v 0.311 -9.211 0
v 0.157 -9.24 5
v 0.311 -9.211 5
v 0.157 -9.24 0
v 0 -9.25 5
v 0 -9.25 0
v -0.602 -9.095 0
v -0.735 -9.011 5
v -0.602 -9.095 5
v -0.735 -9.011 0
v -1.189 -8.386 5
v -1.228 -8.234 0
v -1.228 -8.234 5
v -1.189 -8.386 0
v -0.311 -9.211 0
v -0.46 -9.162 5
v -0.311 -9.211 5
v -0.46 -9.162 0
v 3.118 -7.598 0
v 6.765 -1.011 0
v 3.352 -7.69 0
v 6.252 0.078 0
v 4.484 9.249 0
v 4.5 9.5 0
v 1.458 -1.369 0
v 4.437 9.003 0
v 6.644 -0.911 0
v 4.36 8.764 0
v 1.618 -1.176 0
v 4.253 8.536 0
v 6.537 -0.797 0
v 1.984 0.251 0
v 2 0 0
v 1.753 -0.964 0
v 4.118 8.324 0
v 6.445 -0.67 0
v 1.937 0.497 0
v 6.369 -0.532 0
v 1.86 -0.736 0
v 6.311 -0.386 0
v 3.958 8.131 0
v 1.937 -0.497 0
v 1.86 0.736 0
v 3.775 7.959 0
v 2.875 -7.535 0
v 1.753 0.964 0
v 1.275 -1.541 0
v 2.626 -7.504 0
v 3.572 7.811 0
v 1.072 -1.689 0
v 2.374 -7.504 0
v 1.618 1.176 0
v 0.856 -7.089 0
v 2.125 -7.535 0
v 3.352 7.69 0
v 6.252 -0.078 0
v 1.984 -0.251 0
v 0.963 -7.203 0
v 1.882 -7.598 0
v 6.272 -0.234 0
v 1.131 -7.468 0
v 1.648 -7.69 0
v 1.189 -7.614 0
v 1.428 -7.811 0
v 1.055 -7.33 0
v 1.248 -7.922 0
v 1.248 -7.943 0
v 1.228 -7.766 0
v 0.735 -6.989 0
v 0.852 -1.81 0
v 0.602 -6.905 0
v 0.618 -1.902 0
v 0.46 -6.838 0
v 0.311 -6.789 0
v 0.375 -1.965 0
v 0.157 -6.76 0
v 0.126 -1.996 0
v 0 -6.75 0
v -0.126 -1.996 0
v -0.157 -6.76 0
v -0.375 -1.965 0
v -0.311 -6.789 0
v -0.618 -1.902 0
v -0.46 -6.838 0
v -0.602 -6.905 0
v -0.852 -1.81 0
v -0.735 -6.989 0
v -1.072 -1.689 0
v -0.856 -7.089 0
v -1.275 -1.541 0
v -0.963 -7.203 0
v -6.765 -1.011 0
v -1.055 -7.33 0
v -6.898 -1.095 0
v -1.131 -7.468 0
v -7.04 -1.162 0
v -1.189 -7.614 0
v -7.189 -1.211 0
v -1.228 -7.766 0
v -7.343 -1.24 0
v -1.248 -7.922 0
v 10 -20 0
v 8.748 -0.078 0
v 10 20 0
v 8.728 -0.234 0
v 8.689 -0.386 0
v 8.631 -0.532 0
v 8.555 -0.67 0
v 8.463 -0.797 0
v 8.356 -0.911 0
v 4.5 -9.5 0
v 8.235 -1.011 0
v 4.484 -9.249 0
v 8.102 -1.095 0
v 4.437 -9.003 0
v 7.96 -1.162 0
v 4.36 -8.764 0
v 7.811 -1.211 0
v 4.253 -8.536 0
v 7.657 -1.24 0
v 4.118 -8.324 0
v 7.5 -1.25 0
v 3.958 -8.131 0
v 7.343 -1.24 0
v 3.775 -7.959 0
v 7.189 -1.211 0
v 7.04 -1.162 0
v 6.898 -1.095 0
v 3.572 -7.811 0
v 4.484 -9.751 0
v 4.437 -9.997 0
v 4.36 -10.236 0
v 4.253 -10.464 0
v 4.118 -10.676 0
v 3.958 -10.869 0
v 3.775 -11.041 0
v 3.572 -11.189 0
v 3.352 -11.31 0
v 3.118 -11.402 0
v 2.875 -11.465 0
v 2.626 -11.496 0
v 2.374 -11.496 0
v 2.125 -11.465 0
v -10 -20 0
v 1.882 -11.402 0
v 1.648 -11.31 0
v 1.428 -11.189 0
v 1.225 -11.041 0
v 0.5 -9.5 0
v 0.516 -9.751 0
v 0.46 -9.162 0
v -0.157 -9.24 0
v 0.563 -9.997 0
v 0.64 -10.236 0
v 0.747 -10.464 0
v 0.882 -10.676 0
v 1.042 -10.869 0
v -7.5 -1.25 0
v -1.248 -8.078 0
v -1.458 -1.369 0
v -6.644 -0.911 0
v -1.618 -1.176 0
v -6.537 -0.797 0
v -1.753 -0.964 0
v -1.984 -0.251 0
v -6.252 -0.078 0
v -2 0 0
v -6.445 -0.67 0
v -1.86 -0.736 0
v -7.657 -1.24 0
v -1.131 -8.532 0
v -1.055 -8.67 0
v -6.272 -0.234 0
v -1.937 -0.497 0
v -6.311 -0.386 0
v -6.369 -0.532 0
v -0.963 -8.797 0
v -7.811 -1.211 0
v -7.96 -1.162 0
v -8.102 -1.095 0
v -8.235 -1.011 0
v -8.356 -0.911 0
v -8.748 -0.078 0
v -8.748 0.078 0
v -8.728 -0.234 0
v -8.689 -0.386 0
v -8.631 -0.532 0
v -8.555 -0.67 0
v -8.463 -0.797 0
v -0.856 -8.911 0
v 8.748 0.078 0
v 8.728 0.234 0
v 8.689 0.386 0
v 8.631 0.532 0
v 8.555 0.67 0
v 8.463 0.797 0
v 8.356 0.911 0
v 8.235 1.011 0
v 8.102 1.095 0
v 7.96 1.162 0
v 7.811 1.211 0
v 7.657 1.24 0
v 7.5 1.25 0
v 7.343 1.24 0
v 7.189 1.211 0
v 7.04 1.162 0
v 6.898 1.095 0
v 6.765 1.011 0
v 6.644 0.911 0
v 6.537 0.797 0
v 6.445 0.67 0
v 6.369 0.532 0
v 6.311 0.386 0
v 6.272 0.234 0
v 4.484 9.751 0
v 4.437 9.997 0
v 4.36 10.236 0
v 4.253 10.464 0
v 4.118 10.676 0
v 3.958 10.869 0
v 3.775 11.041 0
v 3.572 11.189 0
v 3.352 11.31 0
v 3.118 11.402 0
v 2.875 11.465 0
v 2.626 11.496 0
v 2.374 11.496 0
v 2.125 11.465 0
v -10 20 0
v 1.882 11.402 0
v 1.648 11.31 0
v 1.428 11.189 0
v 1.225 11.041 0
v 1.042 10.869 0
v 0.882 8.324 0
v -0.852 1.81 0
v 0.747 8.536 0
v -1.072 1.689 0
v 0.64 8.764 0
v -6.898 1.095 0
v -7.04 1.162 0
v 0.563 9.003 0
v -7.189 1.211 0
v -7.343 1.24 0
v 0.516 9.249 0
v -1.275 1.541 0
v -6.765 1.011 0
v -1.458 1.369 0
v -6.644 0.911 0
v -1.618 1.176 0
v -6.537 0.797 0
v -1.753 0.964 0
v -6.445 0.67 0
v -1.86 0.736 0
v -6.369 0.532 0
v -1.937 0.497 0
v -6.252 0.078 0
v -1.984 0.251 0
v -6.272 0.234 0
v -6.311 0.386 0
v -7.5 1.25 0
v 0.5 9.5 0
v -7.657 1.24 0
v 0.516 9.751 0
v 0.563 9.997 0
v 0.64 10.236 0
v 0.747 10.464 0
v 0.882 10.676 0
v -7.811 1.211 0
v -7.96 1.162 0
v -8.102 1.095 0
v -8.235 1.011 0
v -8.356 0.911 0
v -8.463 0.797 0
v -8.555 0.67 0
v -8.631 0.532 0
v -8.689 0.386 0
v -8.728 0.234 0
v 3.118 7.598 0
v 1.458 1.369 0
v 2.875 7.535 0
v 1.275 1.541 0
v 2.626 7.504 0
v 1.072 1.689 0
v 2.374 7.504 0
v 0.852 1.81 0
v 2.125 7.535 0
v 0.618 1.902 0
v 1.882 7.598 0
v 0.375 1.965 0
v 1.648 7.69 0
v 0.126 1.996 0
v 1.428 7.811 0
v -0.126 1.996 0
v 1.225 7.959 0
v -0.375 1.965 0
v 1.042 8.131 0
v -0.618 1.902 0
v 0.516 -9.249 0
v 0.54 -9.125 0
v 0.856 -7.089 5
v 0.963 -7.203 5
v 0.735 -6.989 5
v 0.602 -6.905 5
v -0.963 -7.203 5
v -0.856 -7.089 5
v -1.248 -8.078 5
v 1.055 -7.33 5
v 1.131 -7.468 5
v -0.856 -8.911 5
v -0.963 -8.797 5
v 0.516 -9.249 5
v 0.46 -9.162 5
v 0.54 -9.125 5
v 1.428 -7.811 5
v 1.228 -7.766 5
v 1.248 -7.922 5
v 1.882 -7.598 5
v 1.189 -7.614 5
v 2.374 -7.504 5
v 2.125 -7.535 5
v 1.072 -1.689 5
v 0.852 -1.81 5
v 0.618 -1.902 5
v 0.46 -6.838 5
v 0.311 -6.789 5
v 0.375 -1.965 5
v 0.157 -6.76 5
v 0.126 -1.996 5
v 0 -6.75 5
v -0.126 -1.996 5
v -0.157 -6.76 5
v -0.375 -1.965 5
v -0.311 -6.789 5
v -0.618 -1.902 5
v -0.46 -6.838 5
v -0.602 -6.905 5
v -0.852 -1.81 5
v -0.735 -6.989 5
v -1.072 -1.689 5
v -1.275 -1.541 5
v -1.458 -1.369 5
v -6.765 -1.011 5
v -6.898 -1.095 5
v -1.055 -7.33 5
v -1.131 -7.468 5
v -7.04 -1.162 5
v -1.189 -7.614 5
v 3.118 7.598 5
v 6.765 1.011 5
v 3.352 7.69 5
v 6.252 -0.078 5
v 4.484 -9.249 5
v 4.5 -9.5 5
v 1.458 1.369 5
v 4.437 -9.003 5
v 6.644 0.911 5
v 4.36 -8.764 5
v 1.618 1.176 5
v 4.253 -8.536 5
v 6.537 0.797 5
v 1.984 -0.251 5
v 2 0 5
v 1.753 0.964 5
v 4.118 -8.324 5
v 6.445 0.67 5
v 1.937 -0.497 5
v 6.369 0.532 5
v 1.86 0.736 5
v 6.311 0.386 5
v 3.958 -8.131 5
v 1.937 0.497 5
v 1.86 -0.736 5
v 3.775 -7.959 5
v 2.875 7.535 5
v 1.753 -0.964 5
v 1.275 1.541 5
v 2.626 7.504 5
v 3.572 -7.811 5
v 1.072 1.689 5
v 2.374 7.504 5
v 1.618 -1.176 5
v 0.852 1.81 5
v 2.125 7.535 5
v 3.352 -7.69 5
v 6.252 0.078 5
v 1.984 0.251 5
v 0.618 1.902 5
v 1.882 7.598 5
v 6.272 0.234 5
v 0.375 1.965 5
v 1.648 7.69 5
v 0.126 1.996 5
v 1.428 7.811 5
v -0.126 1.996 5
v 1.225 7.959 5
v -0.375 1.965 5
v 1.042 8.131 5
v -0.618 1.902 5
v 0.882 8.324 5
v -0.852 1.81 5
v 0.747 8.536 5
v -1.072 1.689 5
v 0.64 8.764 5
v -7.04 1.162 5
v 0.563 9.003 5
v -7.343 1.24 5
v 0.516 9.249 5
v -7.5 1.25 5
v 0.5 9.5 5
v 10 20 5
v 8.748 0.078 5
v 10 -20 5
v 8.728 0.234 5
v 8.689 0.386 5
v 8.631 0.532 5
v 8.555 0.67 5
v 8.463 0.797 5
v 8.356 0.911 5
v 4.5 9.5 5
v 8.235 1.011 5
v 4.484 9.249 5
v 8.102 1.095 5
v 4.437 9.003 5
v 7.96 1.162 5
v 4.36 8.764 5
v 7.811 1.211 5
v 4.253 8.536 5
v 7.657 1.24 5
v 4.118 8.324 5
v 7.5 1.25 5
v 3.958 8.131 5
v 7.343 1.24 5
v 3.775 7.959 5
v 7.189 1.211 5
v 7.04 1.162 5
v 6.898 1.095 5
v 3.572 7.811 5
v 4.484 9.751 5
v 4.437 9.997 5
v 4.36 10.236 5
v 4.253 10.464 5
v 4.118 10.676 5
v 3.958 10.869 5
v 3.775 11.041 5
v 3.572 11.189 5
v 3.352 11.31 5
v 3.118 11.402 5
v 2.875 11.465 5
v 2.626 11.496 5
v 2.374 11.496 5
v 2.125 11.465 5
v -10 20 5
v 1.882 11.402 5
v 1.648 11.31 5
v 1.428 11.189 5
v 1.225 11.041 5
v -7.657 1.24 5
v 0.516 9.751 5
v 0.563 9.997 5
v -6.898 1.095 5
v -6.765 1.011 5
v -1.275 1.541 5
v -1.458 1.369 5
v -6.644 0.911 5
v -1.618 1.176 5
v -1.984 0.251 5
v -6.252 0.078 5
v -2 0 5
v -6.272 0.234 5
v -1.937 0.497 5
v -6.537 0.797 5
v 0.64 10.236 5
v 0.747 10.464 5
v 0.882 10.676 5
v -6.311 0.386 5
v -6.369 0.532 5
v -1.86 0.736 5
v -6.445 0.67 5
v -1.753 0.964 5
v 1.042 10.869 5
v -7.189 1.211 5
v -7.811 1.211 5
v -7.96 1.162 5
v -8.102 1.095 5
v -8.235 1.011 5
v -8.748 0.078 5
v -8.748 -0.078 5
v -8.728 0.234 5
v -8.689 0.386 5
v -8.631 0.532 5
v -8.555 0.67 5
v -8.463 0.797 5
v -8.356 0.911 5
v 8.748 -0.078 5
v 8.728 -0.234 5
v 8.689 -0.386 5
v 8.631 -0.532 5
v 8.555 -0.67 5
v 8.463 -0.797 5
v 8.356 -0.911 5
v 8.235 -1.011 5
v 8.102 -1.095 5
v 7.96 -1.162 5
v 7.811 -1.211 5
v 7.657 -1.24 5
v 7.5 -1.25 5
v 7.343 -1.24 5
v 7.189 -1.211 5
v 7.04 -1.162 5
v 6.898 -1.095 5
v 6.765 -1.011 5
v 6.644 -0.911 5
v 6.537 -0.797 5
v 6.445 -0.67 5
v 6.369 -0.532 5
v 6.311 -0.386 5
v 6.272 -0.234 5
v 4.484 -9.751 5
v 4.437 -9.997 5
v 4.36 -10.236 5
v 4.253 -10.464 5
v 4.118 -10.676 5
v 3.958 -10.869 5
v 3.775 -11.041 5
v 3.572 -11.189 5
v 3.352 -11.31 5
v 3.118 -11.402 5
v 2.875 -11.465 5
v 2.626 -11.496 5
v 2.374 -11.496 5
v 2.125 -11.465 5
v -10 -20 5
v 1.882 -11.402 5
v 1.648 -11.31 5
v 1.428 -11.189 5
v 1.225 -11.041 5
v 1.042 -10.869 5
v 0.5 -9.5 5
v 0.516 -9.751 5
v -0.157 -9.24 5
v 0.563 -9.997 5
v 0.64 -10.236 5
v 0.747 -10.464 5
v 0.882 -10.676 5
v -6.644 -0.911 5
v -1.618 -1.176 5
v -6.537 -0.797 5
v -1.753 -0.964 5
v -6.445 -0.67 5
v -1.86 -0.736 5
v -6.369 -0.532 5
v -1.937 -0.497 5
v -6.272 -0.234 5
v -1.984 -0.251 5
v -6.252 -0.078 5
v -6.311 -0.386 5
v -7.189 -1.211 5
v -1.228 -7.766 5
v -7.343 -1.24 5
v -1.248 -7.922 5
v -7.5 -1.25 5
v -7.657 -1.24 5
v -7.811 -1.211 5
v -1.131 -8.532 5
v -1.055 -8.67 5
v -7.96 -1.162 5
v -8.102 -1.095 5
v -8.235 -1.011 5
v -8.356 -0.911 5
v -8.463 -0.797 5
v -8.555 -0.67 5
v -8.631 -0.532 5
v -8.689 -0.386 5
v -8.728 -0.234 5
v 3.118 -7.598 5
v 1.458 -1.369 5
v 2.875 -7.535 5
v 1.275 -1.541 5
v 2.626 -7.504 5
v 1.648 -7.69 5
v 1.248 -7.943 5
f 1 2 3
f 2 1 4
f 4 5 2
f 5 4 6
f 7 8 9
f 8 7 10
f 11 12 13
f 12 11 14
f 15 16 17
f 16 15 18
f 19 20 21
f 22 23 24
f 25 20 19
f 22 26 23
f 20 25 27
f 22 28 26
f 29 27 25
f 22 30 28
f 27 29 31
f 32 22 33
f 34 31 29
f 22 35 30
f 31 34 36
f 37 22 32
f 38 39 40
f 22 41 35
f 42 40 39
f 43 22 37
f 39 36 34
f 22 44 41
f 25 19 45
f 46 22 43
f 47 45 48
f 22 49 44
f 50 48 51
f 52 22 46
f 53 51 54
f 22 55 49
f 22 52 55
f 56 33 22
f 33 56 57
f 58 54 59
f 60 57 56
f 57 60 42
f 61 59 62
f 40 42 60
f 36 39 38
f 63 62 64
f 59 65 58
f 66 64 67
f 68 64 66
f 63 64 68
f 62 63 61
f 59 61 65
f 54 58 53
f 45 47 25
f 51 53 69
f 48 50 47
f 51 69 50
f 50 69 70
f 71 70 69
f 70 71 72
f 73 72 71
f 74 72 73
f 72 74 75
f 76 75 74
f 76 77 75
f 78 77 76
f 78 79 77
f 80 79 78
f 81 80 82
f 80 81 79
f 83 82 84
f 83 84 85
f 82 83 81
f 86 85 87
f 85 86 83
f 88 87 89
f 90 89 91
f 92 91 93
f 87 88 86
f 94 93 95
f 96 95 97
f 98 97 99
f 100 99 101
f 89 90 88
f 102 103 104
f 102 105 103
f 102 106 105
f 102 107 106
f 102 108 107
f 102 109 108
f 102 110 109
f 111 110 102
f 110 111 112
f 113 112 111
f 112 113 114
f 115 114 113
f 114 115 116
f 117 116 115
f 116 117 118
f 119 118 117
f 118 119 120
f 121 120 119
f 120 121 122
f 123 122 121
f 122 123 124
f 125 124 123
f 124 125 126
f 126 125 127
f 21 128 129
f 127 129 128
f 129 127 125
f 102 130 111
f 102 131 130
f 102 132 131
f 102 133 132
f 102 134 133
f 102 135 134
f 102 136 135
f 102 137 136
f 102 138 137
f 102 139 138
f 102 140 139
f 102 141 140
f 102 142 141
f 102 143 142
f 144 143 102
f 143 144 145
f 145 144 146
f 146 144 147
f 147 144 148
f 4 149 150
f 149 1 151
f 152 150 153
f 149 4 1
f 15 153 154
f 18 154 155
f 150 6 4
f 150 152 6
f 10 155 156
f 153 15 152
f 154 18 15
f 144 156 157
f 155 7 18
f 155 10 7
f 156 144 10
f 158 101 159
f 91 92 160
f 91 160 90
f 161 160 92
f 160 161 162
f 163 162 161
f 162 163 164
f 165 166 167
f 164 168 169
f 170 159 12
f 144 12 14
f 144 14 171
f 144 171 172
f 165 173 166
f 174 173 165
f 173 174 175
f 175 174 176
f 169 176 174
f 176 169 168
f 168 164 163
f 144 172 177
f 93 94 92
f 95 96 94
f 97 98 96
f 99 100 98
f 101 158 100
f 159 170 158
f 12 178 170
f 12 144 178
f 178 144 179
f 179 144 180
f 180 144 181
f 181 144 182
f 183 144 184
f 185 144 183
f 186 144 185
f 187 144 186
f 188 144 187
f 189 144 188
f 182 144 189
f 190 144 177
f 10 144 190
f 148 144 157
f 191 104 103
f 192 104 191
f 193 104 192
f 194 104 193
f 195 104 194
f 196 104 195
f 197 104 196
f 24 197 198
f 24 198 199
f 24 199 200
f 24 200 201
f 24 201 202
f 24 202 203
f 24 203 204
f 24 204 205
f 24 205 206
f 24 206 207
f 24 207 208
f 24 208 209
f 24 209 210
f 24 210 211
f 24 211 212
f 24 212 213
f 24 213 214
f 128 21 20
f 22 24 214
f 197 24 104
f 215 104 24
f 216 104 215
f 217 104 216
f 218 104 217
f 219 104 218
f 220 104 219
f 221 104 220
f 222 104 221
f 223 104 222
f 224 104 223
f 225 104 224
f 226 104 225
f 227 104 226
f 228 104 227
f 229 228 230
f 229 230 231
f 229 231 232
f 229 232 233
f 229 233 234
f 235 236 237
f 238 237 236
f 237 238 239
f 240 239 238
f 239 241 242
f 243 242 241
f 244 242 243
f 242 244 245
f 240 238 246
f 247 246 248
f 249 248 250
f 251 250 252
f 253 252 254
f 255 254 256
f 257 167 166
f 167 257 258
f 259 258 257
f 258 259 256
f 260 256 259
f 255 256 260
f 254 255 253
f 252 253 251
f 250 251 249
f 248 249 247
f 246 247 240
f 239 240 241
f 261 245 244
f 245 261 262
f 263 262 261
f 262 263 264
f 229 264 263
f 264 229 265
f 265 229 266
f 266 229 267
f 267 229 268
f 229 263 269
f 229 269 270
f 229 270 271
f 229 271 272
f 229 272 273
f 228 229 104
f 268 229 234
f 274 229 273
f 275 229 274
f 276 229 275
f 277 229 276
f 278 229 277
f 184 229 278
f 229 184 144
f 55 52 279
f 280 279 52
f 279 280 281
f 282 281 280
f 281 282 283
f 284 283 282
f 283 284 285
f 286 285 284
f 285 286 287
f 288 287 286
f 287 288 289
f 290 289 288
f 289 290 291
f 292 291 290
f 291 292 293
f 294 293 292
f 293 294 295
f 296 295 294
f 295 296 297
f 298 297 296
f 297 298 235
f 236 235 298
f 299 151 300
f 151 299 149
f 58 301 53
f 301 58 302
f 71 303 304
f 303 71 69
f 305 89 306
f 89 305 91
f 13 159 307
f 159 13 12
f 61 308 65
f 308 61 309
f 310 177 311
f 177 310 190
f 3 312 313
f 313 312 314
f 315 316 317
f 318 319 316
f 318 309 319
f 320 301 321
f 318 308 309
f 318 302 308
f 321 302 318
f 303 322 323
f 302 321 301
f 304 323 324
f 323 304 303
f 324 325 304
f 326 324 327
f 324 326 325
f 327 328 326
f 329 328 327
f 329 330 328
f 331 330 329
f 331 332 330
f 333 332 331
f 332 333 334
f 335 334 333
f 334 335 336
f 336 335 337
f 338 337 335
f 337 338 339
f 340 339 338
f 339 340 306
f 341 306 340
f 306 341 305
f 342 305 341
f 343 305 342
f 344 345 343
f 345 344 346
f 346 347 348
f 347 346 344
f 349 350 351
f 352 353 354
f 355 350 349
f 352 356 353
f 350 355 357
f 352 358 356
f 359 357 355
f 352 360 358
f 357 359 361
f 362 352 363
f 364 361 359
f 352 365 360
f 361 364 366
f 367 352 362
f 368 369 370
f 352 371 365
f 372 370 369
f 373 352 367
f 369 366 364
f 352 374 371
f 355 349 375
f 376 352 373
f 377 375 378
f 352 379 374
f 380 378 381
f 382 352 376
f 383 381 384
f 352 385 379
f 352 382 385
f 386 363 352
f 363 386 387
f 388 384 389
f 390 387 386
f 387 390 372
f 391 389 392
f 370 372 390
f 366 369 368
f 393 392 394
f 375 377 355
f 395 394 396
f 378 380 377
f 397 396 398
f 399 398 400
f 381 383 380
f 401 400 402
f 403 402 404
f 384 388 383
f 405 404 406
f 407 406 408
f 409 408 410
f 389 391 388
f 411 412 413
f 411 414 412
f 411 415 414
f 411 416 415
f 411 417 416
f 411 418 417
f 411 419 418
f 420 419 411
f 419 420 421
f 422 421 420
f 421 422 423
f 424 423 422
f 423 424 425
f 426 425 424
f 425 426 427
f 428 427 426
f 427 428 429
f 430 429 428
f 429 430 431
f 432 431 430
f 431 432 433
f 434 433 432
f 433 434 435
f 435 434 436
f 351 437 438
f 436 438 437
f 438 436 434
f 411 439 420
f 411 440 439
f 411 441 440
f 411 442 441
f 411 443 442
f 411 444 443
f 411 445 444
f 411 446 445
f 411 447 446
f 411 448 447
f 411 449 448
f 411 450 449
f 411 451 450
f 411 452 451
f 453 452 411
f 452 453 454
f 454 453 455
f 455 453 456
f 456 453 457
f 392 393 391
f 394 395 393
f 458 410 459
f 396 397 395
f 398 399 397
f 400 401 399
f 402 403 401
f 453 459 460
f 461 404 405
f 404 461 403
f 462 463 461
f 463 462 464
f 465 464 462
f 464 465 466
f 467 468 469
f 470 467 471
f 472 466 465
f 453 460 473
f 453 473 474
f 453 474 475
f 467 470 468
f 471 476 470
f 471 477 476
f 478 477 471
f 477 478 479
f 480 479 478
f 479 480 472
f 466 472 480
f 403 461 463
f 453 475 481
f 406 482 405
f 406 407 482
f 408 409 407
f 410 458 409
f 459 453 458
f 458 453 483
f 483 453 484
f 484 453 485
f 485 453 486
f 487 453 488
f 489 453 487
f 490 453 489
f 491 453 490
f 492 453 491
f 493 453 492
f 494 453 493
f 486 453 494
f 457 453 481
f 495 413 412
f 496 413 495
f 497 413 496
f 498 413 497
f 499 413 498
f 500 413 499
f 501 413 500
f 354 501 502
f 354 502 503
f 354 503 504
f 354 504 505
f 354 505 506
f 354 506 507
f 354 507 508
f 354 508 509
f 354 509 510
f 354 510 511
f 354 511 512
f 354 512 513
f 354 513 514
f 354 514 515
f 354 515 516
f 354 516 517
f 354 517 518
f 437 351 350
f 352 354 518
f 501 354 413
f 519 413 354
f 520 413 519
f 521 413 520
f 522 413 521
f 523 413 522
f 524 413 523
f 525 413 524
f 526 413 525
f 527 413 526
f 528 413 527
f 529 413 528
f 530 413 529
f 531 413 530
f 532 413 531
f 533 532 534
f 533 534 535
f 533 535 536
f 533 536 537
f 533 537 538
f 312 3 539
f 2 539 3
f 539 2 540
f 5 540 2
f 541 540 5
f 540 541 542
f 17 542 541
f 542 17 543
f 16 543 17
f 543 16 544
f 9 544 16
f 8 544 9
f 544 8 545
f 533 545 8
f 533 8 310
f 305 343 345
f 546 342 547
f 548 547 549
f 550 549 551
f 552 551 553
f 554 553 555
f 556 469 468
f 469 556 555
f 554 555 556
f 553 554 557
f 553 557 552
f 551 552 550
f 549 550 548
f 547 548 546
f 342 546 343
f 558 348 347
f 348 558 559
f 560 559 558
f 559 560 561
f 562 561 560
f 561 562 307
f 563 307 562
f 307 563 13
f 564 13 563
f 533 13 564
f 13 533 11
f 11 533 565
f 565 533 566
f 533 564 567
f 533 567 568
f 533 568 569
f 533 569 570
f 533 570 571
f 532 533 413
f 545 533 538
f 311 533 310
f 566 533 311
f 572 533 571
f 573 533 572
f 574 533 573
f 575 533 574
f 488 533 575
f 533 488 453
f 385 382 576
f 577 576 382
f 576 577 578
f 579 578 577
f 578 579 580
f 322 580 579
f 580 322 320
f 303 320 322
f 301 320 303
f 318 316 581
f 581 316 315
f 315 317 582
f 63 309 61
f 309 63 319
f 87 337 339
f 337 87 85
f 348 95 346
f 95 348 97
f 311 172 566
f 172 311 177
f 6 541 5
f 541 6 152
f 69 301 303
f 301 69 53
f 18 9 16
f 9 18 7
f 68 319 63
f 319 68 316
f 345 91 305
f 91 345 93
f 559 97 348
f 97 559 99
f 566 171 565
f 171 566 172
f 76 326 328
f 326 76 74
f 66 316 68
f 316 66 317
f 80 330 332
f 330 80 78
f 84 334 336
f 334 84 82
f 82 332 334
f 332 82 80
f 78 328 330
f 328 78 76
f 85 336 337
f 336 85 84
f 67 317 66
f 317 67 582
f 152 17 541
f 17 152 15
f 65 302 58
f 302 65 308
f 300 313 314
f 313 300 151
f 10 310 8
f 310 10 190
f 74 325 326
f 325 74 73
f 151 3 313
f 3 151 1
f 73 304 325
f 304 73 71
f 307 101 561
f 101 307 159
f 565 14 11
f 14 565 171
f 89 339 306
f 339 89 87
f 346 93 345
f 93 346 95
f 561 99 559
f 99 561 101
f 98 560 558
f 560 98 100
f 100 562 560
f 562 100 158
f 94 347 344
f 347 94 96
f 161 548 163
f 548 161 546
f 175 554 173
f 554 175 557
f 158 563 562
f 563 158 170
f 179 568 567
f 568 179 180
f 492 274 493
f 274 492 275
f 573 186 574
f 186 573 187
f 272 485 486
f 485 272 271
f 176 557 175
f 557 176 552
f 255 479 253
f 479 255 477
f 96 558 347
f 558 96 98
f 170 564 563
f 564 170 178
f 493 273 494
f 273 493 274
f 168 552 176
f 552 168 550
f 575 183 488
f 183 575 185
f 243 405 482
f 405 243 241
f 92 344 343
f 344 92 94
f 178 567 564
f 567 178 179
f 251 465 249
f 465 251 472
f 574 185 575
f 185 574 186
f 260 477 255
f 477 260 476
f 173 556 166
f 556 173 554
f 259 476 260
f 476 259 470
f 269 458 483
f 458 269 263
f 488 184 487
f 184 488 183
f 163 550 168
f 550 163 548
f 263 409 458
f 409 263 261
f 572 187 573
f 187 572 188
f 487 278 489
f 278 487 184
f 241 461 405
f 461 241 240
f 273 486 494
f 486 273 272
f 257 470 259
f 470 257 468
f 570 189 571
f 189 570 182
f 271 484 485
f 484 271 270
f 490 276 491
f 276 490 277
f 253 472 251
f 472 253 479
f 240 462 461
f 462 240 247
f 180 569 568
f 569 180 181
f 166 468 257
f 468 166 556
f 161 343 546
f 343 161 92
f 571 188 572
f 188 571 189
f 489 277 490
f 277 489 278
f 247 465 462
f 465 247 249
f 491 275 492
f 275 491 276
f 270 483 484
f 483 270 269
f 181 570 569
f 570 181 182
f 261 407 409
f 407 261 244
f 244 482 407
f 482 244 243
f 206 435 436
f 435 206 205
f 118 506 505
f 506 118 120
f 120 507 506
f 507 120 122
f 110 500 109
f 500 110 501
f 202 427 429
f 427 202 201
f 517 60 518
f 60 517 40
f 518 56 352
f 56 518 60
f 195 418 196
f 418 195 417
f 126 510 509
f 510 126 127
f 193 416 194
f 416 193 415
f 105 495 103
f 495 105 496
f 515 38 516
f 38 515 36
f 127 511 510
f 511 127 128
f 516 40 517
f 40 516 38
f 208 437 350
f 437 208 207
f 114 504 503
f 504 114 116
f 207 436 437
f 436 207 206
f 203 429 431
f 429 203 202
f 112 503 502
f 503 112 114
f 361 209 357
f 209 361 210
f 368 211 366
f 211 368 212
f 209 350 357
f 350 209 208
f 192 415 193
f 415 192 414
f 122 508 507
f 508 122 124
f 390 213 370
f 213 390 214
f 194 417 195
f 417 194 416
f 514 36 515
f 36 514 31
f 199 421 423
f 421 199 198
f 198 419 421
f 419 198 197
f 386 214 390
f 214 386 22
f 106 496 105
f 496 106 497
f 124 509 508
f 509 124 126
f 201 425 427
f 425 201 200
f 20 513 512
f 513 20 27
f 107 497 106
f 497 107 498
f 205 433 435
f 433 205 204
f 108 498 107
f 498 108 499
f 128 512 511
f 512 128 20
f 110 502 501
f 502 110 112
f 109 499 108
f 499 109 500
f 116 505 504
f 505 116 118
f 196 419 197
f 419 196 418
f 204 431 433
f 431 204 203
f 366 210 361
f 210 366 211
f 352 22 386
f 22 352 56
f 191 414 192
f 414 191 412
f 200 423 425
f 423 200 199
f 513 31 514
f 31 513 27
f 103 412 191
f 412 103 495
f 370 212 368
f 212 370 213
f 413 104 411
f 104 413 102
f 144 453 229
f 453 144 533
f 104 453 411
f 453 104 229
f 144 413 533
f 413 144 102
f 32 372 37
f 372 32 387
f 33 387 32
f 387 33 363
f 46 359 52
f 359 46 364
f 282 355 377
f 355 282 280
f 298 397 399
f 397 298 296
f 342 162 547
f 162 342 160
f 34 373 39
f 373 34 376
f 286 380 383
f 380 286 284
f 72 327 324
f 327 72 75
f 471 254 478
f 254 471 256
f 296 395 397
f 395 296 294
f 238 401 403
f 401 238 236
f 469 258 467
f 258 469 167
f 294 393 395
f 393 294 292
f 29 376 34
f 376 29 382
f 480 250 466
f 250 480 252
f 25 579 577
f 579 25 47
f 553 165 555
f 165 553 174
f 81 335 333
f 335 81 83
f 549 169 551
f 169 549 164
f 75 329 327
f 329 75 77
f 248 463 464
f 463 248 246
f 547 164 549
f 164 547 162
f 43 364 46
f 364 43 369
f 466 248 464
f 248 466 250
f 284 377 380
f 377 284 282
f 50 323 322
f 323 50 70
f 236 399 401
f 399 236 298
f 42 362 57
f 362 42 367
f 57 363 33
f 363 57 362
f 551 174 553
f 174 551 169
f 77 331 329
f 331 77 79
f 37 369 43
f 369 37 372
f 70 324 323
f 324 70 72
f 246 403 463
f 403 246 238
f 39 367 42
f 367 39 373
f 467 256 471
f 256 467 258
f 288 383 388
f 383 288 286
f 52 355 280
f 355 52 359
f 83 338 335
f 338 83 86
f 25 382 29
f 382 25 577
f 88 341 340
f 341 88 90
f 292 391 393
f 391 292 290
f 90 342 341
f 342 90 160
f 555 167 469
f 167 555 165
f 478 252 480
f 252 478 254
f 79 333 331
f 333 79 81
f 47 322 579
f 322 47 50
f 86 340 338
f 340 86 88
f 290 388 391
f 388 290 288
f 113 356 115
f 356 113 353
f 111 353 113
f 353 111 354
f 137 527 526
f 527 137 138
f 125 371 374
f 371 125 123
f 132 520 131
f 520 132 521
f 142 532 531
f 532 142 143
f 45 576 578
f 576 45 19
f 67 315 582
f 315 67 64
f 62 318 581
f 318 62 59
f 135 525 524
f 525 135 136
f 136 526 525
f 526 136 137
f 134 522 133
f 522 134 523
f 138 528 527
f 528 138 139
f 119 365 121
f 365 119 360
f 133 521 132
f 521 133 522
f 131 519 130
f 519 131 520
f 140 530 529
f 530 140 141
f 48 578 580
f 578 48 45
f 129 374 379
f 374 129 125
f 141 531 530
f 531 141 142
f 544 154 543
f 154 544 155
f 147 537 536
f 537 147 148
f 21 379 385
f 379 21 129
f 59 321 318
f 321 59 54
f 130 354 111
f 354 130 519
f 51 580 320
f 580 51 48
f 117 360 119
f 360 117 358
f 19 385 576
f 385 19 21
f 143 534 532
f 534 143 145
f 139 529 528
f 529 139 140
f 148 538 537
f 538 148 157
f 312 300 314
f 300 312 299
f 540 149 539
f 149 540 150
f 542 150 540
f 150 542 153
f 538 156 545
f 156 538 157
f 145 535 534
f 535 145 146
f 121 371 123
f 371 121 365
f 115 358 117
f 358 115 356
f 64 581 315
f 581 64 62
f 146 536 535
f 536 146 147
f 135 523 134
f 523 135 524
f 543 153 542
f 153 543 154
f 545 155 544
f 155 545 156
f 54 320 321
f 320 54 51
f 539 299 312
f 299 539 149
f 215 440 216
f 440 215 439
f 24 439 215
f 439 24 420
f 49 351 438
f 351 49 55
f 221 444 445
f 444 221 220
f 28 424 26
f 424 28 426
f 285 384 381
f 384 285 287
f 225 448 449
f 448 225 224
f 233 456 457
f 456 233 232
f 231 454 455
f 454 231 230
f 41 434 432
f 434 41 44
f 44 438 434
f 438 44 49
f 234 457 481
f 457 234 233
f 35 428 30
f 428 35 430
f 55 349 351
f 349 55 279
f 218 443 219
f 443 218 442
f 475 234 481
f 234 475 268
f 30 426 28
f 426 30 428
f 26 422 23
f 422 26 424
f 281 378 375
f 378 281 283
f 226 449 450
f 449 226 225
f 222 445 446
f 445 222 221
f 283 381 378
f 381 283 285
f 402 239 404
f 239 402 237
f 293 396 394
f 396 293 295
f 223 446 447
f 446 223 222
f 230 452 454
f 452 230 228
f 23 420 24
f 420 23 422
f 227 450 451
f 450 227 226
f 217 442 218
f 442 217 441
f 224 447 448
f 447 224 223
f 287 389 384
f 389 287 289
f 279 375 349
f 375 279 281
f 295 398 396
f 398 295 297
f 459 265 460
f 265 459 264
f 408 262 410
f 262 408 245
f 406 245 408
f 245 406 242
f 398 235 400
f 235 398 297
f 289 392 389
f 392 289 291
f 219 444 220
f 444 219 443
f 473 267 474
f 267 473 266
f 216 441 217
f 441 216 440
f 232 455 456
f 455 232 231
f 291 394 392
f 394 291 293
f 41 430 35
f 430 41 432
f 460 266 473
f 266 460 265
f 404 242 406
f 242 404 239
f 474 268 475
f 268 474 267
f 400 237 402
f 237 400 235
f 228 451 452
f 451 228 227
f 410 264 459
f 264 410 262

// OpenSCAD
EXTRUDER_MOUNT_HOLE_DIA = 4;
EXTRUDER_MOUNT_HOLE_SPACING = 19;
EXTRUDER_MOUNT_HOLE_OFFSET = 2.5;

HOTEND_MOUNT_HOLE_DIA = 2.5;
HOTEND_MOUNT_HOLE_SPACING = 15;
HOTEND_MOUNT_HOLE_OFFSET = 8;

HOTEND_MOUNT_ANGLE = -90;

HEATBREAK_DIA = 4;

THICKNESS = 5;
WIDTH = 20;
LENGTH = 40;


$fn = 50;

difference() {
  translate([-WIDTH/2, -LENGTH/2, 0])
  cube([WIDTH, LENGTH, THICKNESS]);

  #cylinder(d = HEATBREAK_DIA, h = THICKNESS);

  rotate([0, 0, HOTEND_MOUNT_ANGLE]) {
    #translate([HOTEND_MOUNT_HOLE_OFFSET, 0, 0])
    cylinder(d = HOTEND_MOUNT_HOLE_DIA, h = THICKNESS);

    #translate([0, -HOTEND_MOUNT_HOLE_SPACING/2, 0])
    cylinder(d = HOTEND_MOUNT_HOLE_DIA, h = THICKNESS);

    #translate([0, HOTEND_MOUNT_HOLE_SPACING/2, 0])
    cylinder(d = HOTEND_MOUNT_HOLE_DIA, h = THICKNESS);
  }

  #translate([EXTRUDER_MOUNT_HOLE_OFFSET, -EXTRUDER_MOUNT_HOLE_SPACING/2, 0])
  cylinder(d = EXTRUDER_MOUNT_HOLE_DIA, h = THICKNESS);

  #translate([EXTRUDER_MOUNT_HOLE_OFFSET, EXTRUDER_MOUNT_HOLE_SPACING/2, 0])
  cylinder(d = EXTRUDER_MOUNT_HOLE_DIA, h = THICKNESS);
}
